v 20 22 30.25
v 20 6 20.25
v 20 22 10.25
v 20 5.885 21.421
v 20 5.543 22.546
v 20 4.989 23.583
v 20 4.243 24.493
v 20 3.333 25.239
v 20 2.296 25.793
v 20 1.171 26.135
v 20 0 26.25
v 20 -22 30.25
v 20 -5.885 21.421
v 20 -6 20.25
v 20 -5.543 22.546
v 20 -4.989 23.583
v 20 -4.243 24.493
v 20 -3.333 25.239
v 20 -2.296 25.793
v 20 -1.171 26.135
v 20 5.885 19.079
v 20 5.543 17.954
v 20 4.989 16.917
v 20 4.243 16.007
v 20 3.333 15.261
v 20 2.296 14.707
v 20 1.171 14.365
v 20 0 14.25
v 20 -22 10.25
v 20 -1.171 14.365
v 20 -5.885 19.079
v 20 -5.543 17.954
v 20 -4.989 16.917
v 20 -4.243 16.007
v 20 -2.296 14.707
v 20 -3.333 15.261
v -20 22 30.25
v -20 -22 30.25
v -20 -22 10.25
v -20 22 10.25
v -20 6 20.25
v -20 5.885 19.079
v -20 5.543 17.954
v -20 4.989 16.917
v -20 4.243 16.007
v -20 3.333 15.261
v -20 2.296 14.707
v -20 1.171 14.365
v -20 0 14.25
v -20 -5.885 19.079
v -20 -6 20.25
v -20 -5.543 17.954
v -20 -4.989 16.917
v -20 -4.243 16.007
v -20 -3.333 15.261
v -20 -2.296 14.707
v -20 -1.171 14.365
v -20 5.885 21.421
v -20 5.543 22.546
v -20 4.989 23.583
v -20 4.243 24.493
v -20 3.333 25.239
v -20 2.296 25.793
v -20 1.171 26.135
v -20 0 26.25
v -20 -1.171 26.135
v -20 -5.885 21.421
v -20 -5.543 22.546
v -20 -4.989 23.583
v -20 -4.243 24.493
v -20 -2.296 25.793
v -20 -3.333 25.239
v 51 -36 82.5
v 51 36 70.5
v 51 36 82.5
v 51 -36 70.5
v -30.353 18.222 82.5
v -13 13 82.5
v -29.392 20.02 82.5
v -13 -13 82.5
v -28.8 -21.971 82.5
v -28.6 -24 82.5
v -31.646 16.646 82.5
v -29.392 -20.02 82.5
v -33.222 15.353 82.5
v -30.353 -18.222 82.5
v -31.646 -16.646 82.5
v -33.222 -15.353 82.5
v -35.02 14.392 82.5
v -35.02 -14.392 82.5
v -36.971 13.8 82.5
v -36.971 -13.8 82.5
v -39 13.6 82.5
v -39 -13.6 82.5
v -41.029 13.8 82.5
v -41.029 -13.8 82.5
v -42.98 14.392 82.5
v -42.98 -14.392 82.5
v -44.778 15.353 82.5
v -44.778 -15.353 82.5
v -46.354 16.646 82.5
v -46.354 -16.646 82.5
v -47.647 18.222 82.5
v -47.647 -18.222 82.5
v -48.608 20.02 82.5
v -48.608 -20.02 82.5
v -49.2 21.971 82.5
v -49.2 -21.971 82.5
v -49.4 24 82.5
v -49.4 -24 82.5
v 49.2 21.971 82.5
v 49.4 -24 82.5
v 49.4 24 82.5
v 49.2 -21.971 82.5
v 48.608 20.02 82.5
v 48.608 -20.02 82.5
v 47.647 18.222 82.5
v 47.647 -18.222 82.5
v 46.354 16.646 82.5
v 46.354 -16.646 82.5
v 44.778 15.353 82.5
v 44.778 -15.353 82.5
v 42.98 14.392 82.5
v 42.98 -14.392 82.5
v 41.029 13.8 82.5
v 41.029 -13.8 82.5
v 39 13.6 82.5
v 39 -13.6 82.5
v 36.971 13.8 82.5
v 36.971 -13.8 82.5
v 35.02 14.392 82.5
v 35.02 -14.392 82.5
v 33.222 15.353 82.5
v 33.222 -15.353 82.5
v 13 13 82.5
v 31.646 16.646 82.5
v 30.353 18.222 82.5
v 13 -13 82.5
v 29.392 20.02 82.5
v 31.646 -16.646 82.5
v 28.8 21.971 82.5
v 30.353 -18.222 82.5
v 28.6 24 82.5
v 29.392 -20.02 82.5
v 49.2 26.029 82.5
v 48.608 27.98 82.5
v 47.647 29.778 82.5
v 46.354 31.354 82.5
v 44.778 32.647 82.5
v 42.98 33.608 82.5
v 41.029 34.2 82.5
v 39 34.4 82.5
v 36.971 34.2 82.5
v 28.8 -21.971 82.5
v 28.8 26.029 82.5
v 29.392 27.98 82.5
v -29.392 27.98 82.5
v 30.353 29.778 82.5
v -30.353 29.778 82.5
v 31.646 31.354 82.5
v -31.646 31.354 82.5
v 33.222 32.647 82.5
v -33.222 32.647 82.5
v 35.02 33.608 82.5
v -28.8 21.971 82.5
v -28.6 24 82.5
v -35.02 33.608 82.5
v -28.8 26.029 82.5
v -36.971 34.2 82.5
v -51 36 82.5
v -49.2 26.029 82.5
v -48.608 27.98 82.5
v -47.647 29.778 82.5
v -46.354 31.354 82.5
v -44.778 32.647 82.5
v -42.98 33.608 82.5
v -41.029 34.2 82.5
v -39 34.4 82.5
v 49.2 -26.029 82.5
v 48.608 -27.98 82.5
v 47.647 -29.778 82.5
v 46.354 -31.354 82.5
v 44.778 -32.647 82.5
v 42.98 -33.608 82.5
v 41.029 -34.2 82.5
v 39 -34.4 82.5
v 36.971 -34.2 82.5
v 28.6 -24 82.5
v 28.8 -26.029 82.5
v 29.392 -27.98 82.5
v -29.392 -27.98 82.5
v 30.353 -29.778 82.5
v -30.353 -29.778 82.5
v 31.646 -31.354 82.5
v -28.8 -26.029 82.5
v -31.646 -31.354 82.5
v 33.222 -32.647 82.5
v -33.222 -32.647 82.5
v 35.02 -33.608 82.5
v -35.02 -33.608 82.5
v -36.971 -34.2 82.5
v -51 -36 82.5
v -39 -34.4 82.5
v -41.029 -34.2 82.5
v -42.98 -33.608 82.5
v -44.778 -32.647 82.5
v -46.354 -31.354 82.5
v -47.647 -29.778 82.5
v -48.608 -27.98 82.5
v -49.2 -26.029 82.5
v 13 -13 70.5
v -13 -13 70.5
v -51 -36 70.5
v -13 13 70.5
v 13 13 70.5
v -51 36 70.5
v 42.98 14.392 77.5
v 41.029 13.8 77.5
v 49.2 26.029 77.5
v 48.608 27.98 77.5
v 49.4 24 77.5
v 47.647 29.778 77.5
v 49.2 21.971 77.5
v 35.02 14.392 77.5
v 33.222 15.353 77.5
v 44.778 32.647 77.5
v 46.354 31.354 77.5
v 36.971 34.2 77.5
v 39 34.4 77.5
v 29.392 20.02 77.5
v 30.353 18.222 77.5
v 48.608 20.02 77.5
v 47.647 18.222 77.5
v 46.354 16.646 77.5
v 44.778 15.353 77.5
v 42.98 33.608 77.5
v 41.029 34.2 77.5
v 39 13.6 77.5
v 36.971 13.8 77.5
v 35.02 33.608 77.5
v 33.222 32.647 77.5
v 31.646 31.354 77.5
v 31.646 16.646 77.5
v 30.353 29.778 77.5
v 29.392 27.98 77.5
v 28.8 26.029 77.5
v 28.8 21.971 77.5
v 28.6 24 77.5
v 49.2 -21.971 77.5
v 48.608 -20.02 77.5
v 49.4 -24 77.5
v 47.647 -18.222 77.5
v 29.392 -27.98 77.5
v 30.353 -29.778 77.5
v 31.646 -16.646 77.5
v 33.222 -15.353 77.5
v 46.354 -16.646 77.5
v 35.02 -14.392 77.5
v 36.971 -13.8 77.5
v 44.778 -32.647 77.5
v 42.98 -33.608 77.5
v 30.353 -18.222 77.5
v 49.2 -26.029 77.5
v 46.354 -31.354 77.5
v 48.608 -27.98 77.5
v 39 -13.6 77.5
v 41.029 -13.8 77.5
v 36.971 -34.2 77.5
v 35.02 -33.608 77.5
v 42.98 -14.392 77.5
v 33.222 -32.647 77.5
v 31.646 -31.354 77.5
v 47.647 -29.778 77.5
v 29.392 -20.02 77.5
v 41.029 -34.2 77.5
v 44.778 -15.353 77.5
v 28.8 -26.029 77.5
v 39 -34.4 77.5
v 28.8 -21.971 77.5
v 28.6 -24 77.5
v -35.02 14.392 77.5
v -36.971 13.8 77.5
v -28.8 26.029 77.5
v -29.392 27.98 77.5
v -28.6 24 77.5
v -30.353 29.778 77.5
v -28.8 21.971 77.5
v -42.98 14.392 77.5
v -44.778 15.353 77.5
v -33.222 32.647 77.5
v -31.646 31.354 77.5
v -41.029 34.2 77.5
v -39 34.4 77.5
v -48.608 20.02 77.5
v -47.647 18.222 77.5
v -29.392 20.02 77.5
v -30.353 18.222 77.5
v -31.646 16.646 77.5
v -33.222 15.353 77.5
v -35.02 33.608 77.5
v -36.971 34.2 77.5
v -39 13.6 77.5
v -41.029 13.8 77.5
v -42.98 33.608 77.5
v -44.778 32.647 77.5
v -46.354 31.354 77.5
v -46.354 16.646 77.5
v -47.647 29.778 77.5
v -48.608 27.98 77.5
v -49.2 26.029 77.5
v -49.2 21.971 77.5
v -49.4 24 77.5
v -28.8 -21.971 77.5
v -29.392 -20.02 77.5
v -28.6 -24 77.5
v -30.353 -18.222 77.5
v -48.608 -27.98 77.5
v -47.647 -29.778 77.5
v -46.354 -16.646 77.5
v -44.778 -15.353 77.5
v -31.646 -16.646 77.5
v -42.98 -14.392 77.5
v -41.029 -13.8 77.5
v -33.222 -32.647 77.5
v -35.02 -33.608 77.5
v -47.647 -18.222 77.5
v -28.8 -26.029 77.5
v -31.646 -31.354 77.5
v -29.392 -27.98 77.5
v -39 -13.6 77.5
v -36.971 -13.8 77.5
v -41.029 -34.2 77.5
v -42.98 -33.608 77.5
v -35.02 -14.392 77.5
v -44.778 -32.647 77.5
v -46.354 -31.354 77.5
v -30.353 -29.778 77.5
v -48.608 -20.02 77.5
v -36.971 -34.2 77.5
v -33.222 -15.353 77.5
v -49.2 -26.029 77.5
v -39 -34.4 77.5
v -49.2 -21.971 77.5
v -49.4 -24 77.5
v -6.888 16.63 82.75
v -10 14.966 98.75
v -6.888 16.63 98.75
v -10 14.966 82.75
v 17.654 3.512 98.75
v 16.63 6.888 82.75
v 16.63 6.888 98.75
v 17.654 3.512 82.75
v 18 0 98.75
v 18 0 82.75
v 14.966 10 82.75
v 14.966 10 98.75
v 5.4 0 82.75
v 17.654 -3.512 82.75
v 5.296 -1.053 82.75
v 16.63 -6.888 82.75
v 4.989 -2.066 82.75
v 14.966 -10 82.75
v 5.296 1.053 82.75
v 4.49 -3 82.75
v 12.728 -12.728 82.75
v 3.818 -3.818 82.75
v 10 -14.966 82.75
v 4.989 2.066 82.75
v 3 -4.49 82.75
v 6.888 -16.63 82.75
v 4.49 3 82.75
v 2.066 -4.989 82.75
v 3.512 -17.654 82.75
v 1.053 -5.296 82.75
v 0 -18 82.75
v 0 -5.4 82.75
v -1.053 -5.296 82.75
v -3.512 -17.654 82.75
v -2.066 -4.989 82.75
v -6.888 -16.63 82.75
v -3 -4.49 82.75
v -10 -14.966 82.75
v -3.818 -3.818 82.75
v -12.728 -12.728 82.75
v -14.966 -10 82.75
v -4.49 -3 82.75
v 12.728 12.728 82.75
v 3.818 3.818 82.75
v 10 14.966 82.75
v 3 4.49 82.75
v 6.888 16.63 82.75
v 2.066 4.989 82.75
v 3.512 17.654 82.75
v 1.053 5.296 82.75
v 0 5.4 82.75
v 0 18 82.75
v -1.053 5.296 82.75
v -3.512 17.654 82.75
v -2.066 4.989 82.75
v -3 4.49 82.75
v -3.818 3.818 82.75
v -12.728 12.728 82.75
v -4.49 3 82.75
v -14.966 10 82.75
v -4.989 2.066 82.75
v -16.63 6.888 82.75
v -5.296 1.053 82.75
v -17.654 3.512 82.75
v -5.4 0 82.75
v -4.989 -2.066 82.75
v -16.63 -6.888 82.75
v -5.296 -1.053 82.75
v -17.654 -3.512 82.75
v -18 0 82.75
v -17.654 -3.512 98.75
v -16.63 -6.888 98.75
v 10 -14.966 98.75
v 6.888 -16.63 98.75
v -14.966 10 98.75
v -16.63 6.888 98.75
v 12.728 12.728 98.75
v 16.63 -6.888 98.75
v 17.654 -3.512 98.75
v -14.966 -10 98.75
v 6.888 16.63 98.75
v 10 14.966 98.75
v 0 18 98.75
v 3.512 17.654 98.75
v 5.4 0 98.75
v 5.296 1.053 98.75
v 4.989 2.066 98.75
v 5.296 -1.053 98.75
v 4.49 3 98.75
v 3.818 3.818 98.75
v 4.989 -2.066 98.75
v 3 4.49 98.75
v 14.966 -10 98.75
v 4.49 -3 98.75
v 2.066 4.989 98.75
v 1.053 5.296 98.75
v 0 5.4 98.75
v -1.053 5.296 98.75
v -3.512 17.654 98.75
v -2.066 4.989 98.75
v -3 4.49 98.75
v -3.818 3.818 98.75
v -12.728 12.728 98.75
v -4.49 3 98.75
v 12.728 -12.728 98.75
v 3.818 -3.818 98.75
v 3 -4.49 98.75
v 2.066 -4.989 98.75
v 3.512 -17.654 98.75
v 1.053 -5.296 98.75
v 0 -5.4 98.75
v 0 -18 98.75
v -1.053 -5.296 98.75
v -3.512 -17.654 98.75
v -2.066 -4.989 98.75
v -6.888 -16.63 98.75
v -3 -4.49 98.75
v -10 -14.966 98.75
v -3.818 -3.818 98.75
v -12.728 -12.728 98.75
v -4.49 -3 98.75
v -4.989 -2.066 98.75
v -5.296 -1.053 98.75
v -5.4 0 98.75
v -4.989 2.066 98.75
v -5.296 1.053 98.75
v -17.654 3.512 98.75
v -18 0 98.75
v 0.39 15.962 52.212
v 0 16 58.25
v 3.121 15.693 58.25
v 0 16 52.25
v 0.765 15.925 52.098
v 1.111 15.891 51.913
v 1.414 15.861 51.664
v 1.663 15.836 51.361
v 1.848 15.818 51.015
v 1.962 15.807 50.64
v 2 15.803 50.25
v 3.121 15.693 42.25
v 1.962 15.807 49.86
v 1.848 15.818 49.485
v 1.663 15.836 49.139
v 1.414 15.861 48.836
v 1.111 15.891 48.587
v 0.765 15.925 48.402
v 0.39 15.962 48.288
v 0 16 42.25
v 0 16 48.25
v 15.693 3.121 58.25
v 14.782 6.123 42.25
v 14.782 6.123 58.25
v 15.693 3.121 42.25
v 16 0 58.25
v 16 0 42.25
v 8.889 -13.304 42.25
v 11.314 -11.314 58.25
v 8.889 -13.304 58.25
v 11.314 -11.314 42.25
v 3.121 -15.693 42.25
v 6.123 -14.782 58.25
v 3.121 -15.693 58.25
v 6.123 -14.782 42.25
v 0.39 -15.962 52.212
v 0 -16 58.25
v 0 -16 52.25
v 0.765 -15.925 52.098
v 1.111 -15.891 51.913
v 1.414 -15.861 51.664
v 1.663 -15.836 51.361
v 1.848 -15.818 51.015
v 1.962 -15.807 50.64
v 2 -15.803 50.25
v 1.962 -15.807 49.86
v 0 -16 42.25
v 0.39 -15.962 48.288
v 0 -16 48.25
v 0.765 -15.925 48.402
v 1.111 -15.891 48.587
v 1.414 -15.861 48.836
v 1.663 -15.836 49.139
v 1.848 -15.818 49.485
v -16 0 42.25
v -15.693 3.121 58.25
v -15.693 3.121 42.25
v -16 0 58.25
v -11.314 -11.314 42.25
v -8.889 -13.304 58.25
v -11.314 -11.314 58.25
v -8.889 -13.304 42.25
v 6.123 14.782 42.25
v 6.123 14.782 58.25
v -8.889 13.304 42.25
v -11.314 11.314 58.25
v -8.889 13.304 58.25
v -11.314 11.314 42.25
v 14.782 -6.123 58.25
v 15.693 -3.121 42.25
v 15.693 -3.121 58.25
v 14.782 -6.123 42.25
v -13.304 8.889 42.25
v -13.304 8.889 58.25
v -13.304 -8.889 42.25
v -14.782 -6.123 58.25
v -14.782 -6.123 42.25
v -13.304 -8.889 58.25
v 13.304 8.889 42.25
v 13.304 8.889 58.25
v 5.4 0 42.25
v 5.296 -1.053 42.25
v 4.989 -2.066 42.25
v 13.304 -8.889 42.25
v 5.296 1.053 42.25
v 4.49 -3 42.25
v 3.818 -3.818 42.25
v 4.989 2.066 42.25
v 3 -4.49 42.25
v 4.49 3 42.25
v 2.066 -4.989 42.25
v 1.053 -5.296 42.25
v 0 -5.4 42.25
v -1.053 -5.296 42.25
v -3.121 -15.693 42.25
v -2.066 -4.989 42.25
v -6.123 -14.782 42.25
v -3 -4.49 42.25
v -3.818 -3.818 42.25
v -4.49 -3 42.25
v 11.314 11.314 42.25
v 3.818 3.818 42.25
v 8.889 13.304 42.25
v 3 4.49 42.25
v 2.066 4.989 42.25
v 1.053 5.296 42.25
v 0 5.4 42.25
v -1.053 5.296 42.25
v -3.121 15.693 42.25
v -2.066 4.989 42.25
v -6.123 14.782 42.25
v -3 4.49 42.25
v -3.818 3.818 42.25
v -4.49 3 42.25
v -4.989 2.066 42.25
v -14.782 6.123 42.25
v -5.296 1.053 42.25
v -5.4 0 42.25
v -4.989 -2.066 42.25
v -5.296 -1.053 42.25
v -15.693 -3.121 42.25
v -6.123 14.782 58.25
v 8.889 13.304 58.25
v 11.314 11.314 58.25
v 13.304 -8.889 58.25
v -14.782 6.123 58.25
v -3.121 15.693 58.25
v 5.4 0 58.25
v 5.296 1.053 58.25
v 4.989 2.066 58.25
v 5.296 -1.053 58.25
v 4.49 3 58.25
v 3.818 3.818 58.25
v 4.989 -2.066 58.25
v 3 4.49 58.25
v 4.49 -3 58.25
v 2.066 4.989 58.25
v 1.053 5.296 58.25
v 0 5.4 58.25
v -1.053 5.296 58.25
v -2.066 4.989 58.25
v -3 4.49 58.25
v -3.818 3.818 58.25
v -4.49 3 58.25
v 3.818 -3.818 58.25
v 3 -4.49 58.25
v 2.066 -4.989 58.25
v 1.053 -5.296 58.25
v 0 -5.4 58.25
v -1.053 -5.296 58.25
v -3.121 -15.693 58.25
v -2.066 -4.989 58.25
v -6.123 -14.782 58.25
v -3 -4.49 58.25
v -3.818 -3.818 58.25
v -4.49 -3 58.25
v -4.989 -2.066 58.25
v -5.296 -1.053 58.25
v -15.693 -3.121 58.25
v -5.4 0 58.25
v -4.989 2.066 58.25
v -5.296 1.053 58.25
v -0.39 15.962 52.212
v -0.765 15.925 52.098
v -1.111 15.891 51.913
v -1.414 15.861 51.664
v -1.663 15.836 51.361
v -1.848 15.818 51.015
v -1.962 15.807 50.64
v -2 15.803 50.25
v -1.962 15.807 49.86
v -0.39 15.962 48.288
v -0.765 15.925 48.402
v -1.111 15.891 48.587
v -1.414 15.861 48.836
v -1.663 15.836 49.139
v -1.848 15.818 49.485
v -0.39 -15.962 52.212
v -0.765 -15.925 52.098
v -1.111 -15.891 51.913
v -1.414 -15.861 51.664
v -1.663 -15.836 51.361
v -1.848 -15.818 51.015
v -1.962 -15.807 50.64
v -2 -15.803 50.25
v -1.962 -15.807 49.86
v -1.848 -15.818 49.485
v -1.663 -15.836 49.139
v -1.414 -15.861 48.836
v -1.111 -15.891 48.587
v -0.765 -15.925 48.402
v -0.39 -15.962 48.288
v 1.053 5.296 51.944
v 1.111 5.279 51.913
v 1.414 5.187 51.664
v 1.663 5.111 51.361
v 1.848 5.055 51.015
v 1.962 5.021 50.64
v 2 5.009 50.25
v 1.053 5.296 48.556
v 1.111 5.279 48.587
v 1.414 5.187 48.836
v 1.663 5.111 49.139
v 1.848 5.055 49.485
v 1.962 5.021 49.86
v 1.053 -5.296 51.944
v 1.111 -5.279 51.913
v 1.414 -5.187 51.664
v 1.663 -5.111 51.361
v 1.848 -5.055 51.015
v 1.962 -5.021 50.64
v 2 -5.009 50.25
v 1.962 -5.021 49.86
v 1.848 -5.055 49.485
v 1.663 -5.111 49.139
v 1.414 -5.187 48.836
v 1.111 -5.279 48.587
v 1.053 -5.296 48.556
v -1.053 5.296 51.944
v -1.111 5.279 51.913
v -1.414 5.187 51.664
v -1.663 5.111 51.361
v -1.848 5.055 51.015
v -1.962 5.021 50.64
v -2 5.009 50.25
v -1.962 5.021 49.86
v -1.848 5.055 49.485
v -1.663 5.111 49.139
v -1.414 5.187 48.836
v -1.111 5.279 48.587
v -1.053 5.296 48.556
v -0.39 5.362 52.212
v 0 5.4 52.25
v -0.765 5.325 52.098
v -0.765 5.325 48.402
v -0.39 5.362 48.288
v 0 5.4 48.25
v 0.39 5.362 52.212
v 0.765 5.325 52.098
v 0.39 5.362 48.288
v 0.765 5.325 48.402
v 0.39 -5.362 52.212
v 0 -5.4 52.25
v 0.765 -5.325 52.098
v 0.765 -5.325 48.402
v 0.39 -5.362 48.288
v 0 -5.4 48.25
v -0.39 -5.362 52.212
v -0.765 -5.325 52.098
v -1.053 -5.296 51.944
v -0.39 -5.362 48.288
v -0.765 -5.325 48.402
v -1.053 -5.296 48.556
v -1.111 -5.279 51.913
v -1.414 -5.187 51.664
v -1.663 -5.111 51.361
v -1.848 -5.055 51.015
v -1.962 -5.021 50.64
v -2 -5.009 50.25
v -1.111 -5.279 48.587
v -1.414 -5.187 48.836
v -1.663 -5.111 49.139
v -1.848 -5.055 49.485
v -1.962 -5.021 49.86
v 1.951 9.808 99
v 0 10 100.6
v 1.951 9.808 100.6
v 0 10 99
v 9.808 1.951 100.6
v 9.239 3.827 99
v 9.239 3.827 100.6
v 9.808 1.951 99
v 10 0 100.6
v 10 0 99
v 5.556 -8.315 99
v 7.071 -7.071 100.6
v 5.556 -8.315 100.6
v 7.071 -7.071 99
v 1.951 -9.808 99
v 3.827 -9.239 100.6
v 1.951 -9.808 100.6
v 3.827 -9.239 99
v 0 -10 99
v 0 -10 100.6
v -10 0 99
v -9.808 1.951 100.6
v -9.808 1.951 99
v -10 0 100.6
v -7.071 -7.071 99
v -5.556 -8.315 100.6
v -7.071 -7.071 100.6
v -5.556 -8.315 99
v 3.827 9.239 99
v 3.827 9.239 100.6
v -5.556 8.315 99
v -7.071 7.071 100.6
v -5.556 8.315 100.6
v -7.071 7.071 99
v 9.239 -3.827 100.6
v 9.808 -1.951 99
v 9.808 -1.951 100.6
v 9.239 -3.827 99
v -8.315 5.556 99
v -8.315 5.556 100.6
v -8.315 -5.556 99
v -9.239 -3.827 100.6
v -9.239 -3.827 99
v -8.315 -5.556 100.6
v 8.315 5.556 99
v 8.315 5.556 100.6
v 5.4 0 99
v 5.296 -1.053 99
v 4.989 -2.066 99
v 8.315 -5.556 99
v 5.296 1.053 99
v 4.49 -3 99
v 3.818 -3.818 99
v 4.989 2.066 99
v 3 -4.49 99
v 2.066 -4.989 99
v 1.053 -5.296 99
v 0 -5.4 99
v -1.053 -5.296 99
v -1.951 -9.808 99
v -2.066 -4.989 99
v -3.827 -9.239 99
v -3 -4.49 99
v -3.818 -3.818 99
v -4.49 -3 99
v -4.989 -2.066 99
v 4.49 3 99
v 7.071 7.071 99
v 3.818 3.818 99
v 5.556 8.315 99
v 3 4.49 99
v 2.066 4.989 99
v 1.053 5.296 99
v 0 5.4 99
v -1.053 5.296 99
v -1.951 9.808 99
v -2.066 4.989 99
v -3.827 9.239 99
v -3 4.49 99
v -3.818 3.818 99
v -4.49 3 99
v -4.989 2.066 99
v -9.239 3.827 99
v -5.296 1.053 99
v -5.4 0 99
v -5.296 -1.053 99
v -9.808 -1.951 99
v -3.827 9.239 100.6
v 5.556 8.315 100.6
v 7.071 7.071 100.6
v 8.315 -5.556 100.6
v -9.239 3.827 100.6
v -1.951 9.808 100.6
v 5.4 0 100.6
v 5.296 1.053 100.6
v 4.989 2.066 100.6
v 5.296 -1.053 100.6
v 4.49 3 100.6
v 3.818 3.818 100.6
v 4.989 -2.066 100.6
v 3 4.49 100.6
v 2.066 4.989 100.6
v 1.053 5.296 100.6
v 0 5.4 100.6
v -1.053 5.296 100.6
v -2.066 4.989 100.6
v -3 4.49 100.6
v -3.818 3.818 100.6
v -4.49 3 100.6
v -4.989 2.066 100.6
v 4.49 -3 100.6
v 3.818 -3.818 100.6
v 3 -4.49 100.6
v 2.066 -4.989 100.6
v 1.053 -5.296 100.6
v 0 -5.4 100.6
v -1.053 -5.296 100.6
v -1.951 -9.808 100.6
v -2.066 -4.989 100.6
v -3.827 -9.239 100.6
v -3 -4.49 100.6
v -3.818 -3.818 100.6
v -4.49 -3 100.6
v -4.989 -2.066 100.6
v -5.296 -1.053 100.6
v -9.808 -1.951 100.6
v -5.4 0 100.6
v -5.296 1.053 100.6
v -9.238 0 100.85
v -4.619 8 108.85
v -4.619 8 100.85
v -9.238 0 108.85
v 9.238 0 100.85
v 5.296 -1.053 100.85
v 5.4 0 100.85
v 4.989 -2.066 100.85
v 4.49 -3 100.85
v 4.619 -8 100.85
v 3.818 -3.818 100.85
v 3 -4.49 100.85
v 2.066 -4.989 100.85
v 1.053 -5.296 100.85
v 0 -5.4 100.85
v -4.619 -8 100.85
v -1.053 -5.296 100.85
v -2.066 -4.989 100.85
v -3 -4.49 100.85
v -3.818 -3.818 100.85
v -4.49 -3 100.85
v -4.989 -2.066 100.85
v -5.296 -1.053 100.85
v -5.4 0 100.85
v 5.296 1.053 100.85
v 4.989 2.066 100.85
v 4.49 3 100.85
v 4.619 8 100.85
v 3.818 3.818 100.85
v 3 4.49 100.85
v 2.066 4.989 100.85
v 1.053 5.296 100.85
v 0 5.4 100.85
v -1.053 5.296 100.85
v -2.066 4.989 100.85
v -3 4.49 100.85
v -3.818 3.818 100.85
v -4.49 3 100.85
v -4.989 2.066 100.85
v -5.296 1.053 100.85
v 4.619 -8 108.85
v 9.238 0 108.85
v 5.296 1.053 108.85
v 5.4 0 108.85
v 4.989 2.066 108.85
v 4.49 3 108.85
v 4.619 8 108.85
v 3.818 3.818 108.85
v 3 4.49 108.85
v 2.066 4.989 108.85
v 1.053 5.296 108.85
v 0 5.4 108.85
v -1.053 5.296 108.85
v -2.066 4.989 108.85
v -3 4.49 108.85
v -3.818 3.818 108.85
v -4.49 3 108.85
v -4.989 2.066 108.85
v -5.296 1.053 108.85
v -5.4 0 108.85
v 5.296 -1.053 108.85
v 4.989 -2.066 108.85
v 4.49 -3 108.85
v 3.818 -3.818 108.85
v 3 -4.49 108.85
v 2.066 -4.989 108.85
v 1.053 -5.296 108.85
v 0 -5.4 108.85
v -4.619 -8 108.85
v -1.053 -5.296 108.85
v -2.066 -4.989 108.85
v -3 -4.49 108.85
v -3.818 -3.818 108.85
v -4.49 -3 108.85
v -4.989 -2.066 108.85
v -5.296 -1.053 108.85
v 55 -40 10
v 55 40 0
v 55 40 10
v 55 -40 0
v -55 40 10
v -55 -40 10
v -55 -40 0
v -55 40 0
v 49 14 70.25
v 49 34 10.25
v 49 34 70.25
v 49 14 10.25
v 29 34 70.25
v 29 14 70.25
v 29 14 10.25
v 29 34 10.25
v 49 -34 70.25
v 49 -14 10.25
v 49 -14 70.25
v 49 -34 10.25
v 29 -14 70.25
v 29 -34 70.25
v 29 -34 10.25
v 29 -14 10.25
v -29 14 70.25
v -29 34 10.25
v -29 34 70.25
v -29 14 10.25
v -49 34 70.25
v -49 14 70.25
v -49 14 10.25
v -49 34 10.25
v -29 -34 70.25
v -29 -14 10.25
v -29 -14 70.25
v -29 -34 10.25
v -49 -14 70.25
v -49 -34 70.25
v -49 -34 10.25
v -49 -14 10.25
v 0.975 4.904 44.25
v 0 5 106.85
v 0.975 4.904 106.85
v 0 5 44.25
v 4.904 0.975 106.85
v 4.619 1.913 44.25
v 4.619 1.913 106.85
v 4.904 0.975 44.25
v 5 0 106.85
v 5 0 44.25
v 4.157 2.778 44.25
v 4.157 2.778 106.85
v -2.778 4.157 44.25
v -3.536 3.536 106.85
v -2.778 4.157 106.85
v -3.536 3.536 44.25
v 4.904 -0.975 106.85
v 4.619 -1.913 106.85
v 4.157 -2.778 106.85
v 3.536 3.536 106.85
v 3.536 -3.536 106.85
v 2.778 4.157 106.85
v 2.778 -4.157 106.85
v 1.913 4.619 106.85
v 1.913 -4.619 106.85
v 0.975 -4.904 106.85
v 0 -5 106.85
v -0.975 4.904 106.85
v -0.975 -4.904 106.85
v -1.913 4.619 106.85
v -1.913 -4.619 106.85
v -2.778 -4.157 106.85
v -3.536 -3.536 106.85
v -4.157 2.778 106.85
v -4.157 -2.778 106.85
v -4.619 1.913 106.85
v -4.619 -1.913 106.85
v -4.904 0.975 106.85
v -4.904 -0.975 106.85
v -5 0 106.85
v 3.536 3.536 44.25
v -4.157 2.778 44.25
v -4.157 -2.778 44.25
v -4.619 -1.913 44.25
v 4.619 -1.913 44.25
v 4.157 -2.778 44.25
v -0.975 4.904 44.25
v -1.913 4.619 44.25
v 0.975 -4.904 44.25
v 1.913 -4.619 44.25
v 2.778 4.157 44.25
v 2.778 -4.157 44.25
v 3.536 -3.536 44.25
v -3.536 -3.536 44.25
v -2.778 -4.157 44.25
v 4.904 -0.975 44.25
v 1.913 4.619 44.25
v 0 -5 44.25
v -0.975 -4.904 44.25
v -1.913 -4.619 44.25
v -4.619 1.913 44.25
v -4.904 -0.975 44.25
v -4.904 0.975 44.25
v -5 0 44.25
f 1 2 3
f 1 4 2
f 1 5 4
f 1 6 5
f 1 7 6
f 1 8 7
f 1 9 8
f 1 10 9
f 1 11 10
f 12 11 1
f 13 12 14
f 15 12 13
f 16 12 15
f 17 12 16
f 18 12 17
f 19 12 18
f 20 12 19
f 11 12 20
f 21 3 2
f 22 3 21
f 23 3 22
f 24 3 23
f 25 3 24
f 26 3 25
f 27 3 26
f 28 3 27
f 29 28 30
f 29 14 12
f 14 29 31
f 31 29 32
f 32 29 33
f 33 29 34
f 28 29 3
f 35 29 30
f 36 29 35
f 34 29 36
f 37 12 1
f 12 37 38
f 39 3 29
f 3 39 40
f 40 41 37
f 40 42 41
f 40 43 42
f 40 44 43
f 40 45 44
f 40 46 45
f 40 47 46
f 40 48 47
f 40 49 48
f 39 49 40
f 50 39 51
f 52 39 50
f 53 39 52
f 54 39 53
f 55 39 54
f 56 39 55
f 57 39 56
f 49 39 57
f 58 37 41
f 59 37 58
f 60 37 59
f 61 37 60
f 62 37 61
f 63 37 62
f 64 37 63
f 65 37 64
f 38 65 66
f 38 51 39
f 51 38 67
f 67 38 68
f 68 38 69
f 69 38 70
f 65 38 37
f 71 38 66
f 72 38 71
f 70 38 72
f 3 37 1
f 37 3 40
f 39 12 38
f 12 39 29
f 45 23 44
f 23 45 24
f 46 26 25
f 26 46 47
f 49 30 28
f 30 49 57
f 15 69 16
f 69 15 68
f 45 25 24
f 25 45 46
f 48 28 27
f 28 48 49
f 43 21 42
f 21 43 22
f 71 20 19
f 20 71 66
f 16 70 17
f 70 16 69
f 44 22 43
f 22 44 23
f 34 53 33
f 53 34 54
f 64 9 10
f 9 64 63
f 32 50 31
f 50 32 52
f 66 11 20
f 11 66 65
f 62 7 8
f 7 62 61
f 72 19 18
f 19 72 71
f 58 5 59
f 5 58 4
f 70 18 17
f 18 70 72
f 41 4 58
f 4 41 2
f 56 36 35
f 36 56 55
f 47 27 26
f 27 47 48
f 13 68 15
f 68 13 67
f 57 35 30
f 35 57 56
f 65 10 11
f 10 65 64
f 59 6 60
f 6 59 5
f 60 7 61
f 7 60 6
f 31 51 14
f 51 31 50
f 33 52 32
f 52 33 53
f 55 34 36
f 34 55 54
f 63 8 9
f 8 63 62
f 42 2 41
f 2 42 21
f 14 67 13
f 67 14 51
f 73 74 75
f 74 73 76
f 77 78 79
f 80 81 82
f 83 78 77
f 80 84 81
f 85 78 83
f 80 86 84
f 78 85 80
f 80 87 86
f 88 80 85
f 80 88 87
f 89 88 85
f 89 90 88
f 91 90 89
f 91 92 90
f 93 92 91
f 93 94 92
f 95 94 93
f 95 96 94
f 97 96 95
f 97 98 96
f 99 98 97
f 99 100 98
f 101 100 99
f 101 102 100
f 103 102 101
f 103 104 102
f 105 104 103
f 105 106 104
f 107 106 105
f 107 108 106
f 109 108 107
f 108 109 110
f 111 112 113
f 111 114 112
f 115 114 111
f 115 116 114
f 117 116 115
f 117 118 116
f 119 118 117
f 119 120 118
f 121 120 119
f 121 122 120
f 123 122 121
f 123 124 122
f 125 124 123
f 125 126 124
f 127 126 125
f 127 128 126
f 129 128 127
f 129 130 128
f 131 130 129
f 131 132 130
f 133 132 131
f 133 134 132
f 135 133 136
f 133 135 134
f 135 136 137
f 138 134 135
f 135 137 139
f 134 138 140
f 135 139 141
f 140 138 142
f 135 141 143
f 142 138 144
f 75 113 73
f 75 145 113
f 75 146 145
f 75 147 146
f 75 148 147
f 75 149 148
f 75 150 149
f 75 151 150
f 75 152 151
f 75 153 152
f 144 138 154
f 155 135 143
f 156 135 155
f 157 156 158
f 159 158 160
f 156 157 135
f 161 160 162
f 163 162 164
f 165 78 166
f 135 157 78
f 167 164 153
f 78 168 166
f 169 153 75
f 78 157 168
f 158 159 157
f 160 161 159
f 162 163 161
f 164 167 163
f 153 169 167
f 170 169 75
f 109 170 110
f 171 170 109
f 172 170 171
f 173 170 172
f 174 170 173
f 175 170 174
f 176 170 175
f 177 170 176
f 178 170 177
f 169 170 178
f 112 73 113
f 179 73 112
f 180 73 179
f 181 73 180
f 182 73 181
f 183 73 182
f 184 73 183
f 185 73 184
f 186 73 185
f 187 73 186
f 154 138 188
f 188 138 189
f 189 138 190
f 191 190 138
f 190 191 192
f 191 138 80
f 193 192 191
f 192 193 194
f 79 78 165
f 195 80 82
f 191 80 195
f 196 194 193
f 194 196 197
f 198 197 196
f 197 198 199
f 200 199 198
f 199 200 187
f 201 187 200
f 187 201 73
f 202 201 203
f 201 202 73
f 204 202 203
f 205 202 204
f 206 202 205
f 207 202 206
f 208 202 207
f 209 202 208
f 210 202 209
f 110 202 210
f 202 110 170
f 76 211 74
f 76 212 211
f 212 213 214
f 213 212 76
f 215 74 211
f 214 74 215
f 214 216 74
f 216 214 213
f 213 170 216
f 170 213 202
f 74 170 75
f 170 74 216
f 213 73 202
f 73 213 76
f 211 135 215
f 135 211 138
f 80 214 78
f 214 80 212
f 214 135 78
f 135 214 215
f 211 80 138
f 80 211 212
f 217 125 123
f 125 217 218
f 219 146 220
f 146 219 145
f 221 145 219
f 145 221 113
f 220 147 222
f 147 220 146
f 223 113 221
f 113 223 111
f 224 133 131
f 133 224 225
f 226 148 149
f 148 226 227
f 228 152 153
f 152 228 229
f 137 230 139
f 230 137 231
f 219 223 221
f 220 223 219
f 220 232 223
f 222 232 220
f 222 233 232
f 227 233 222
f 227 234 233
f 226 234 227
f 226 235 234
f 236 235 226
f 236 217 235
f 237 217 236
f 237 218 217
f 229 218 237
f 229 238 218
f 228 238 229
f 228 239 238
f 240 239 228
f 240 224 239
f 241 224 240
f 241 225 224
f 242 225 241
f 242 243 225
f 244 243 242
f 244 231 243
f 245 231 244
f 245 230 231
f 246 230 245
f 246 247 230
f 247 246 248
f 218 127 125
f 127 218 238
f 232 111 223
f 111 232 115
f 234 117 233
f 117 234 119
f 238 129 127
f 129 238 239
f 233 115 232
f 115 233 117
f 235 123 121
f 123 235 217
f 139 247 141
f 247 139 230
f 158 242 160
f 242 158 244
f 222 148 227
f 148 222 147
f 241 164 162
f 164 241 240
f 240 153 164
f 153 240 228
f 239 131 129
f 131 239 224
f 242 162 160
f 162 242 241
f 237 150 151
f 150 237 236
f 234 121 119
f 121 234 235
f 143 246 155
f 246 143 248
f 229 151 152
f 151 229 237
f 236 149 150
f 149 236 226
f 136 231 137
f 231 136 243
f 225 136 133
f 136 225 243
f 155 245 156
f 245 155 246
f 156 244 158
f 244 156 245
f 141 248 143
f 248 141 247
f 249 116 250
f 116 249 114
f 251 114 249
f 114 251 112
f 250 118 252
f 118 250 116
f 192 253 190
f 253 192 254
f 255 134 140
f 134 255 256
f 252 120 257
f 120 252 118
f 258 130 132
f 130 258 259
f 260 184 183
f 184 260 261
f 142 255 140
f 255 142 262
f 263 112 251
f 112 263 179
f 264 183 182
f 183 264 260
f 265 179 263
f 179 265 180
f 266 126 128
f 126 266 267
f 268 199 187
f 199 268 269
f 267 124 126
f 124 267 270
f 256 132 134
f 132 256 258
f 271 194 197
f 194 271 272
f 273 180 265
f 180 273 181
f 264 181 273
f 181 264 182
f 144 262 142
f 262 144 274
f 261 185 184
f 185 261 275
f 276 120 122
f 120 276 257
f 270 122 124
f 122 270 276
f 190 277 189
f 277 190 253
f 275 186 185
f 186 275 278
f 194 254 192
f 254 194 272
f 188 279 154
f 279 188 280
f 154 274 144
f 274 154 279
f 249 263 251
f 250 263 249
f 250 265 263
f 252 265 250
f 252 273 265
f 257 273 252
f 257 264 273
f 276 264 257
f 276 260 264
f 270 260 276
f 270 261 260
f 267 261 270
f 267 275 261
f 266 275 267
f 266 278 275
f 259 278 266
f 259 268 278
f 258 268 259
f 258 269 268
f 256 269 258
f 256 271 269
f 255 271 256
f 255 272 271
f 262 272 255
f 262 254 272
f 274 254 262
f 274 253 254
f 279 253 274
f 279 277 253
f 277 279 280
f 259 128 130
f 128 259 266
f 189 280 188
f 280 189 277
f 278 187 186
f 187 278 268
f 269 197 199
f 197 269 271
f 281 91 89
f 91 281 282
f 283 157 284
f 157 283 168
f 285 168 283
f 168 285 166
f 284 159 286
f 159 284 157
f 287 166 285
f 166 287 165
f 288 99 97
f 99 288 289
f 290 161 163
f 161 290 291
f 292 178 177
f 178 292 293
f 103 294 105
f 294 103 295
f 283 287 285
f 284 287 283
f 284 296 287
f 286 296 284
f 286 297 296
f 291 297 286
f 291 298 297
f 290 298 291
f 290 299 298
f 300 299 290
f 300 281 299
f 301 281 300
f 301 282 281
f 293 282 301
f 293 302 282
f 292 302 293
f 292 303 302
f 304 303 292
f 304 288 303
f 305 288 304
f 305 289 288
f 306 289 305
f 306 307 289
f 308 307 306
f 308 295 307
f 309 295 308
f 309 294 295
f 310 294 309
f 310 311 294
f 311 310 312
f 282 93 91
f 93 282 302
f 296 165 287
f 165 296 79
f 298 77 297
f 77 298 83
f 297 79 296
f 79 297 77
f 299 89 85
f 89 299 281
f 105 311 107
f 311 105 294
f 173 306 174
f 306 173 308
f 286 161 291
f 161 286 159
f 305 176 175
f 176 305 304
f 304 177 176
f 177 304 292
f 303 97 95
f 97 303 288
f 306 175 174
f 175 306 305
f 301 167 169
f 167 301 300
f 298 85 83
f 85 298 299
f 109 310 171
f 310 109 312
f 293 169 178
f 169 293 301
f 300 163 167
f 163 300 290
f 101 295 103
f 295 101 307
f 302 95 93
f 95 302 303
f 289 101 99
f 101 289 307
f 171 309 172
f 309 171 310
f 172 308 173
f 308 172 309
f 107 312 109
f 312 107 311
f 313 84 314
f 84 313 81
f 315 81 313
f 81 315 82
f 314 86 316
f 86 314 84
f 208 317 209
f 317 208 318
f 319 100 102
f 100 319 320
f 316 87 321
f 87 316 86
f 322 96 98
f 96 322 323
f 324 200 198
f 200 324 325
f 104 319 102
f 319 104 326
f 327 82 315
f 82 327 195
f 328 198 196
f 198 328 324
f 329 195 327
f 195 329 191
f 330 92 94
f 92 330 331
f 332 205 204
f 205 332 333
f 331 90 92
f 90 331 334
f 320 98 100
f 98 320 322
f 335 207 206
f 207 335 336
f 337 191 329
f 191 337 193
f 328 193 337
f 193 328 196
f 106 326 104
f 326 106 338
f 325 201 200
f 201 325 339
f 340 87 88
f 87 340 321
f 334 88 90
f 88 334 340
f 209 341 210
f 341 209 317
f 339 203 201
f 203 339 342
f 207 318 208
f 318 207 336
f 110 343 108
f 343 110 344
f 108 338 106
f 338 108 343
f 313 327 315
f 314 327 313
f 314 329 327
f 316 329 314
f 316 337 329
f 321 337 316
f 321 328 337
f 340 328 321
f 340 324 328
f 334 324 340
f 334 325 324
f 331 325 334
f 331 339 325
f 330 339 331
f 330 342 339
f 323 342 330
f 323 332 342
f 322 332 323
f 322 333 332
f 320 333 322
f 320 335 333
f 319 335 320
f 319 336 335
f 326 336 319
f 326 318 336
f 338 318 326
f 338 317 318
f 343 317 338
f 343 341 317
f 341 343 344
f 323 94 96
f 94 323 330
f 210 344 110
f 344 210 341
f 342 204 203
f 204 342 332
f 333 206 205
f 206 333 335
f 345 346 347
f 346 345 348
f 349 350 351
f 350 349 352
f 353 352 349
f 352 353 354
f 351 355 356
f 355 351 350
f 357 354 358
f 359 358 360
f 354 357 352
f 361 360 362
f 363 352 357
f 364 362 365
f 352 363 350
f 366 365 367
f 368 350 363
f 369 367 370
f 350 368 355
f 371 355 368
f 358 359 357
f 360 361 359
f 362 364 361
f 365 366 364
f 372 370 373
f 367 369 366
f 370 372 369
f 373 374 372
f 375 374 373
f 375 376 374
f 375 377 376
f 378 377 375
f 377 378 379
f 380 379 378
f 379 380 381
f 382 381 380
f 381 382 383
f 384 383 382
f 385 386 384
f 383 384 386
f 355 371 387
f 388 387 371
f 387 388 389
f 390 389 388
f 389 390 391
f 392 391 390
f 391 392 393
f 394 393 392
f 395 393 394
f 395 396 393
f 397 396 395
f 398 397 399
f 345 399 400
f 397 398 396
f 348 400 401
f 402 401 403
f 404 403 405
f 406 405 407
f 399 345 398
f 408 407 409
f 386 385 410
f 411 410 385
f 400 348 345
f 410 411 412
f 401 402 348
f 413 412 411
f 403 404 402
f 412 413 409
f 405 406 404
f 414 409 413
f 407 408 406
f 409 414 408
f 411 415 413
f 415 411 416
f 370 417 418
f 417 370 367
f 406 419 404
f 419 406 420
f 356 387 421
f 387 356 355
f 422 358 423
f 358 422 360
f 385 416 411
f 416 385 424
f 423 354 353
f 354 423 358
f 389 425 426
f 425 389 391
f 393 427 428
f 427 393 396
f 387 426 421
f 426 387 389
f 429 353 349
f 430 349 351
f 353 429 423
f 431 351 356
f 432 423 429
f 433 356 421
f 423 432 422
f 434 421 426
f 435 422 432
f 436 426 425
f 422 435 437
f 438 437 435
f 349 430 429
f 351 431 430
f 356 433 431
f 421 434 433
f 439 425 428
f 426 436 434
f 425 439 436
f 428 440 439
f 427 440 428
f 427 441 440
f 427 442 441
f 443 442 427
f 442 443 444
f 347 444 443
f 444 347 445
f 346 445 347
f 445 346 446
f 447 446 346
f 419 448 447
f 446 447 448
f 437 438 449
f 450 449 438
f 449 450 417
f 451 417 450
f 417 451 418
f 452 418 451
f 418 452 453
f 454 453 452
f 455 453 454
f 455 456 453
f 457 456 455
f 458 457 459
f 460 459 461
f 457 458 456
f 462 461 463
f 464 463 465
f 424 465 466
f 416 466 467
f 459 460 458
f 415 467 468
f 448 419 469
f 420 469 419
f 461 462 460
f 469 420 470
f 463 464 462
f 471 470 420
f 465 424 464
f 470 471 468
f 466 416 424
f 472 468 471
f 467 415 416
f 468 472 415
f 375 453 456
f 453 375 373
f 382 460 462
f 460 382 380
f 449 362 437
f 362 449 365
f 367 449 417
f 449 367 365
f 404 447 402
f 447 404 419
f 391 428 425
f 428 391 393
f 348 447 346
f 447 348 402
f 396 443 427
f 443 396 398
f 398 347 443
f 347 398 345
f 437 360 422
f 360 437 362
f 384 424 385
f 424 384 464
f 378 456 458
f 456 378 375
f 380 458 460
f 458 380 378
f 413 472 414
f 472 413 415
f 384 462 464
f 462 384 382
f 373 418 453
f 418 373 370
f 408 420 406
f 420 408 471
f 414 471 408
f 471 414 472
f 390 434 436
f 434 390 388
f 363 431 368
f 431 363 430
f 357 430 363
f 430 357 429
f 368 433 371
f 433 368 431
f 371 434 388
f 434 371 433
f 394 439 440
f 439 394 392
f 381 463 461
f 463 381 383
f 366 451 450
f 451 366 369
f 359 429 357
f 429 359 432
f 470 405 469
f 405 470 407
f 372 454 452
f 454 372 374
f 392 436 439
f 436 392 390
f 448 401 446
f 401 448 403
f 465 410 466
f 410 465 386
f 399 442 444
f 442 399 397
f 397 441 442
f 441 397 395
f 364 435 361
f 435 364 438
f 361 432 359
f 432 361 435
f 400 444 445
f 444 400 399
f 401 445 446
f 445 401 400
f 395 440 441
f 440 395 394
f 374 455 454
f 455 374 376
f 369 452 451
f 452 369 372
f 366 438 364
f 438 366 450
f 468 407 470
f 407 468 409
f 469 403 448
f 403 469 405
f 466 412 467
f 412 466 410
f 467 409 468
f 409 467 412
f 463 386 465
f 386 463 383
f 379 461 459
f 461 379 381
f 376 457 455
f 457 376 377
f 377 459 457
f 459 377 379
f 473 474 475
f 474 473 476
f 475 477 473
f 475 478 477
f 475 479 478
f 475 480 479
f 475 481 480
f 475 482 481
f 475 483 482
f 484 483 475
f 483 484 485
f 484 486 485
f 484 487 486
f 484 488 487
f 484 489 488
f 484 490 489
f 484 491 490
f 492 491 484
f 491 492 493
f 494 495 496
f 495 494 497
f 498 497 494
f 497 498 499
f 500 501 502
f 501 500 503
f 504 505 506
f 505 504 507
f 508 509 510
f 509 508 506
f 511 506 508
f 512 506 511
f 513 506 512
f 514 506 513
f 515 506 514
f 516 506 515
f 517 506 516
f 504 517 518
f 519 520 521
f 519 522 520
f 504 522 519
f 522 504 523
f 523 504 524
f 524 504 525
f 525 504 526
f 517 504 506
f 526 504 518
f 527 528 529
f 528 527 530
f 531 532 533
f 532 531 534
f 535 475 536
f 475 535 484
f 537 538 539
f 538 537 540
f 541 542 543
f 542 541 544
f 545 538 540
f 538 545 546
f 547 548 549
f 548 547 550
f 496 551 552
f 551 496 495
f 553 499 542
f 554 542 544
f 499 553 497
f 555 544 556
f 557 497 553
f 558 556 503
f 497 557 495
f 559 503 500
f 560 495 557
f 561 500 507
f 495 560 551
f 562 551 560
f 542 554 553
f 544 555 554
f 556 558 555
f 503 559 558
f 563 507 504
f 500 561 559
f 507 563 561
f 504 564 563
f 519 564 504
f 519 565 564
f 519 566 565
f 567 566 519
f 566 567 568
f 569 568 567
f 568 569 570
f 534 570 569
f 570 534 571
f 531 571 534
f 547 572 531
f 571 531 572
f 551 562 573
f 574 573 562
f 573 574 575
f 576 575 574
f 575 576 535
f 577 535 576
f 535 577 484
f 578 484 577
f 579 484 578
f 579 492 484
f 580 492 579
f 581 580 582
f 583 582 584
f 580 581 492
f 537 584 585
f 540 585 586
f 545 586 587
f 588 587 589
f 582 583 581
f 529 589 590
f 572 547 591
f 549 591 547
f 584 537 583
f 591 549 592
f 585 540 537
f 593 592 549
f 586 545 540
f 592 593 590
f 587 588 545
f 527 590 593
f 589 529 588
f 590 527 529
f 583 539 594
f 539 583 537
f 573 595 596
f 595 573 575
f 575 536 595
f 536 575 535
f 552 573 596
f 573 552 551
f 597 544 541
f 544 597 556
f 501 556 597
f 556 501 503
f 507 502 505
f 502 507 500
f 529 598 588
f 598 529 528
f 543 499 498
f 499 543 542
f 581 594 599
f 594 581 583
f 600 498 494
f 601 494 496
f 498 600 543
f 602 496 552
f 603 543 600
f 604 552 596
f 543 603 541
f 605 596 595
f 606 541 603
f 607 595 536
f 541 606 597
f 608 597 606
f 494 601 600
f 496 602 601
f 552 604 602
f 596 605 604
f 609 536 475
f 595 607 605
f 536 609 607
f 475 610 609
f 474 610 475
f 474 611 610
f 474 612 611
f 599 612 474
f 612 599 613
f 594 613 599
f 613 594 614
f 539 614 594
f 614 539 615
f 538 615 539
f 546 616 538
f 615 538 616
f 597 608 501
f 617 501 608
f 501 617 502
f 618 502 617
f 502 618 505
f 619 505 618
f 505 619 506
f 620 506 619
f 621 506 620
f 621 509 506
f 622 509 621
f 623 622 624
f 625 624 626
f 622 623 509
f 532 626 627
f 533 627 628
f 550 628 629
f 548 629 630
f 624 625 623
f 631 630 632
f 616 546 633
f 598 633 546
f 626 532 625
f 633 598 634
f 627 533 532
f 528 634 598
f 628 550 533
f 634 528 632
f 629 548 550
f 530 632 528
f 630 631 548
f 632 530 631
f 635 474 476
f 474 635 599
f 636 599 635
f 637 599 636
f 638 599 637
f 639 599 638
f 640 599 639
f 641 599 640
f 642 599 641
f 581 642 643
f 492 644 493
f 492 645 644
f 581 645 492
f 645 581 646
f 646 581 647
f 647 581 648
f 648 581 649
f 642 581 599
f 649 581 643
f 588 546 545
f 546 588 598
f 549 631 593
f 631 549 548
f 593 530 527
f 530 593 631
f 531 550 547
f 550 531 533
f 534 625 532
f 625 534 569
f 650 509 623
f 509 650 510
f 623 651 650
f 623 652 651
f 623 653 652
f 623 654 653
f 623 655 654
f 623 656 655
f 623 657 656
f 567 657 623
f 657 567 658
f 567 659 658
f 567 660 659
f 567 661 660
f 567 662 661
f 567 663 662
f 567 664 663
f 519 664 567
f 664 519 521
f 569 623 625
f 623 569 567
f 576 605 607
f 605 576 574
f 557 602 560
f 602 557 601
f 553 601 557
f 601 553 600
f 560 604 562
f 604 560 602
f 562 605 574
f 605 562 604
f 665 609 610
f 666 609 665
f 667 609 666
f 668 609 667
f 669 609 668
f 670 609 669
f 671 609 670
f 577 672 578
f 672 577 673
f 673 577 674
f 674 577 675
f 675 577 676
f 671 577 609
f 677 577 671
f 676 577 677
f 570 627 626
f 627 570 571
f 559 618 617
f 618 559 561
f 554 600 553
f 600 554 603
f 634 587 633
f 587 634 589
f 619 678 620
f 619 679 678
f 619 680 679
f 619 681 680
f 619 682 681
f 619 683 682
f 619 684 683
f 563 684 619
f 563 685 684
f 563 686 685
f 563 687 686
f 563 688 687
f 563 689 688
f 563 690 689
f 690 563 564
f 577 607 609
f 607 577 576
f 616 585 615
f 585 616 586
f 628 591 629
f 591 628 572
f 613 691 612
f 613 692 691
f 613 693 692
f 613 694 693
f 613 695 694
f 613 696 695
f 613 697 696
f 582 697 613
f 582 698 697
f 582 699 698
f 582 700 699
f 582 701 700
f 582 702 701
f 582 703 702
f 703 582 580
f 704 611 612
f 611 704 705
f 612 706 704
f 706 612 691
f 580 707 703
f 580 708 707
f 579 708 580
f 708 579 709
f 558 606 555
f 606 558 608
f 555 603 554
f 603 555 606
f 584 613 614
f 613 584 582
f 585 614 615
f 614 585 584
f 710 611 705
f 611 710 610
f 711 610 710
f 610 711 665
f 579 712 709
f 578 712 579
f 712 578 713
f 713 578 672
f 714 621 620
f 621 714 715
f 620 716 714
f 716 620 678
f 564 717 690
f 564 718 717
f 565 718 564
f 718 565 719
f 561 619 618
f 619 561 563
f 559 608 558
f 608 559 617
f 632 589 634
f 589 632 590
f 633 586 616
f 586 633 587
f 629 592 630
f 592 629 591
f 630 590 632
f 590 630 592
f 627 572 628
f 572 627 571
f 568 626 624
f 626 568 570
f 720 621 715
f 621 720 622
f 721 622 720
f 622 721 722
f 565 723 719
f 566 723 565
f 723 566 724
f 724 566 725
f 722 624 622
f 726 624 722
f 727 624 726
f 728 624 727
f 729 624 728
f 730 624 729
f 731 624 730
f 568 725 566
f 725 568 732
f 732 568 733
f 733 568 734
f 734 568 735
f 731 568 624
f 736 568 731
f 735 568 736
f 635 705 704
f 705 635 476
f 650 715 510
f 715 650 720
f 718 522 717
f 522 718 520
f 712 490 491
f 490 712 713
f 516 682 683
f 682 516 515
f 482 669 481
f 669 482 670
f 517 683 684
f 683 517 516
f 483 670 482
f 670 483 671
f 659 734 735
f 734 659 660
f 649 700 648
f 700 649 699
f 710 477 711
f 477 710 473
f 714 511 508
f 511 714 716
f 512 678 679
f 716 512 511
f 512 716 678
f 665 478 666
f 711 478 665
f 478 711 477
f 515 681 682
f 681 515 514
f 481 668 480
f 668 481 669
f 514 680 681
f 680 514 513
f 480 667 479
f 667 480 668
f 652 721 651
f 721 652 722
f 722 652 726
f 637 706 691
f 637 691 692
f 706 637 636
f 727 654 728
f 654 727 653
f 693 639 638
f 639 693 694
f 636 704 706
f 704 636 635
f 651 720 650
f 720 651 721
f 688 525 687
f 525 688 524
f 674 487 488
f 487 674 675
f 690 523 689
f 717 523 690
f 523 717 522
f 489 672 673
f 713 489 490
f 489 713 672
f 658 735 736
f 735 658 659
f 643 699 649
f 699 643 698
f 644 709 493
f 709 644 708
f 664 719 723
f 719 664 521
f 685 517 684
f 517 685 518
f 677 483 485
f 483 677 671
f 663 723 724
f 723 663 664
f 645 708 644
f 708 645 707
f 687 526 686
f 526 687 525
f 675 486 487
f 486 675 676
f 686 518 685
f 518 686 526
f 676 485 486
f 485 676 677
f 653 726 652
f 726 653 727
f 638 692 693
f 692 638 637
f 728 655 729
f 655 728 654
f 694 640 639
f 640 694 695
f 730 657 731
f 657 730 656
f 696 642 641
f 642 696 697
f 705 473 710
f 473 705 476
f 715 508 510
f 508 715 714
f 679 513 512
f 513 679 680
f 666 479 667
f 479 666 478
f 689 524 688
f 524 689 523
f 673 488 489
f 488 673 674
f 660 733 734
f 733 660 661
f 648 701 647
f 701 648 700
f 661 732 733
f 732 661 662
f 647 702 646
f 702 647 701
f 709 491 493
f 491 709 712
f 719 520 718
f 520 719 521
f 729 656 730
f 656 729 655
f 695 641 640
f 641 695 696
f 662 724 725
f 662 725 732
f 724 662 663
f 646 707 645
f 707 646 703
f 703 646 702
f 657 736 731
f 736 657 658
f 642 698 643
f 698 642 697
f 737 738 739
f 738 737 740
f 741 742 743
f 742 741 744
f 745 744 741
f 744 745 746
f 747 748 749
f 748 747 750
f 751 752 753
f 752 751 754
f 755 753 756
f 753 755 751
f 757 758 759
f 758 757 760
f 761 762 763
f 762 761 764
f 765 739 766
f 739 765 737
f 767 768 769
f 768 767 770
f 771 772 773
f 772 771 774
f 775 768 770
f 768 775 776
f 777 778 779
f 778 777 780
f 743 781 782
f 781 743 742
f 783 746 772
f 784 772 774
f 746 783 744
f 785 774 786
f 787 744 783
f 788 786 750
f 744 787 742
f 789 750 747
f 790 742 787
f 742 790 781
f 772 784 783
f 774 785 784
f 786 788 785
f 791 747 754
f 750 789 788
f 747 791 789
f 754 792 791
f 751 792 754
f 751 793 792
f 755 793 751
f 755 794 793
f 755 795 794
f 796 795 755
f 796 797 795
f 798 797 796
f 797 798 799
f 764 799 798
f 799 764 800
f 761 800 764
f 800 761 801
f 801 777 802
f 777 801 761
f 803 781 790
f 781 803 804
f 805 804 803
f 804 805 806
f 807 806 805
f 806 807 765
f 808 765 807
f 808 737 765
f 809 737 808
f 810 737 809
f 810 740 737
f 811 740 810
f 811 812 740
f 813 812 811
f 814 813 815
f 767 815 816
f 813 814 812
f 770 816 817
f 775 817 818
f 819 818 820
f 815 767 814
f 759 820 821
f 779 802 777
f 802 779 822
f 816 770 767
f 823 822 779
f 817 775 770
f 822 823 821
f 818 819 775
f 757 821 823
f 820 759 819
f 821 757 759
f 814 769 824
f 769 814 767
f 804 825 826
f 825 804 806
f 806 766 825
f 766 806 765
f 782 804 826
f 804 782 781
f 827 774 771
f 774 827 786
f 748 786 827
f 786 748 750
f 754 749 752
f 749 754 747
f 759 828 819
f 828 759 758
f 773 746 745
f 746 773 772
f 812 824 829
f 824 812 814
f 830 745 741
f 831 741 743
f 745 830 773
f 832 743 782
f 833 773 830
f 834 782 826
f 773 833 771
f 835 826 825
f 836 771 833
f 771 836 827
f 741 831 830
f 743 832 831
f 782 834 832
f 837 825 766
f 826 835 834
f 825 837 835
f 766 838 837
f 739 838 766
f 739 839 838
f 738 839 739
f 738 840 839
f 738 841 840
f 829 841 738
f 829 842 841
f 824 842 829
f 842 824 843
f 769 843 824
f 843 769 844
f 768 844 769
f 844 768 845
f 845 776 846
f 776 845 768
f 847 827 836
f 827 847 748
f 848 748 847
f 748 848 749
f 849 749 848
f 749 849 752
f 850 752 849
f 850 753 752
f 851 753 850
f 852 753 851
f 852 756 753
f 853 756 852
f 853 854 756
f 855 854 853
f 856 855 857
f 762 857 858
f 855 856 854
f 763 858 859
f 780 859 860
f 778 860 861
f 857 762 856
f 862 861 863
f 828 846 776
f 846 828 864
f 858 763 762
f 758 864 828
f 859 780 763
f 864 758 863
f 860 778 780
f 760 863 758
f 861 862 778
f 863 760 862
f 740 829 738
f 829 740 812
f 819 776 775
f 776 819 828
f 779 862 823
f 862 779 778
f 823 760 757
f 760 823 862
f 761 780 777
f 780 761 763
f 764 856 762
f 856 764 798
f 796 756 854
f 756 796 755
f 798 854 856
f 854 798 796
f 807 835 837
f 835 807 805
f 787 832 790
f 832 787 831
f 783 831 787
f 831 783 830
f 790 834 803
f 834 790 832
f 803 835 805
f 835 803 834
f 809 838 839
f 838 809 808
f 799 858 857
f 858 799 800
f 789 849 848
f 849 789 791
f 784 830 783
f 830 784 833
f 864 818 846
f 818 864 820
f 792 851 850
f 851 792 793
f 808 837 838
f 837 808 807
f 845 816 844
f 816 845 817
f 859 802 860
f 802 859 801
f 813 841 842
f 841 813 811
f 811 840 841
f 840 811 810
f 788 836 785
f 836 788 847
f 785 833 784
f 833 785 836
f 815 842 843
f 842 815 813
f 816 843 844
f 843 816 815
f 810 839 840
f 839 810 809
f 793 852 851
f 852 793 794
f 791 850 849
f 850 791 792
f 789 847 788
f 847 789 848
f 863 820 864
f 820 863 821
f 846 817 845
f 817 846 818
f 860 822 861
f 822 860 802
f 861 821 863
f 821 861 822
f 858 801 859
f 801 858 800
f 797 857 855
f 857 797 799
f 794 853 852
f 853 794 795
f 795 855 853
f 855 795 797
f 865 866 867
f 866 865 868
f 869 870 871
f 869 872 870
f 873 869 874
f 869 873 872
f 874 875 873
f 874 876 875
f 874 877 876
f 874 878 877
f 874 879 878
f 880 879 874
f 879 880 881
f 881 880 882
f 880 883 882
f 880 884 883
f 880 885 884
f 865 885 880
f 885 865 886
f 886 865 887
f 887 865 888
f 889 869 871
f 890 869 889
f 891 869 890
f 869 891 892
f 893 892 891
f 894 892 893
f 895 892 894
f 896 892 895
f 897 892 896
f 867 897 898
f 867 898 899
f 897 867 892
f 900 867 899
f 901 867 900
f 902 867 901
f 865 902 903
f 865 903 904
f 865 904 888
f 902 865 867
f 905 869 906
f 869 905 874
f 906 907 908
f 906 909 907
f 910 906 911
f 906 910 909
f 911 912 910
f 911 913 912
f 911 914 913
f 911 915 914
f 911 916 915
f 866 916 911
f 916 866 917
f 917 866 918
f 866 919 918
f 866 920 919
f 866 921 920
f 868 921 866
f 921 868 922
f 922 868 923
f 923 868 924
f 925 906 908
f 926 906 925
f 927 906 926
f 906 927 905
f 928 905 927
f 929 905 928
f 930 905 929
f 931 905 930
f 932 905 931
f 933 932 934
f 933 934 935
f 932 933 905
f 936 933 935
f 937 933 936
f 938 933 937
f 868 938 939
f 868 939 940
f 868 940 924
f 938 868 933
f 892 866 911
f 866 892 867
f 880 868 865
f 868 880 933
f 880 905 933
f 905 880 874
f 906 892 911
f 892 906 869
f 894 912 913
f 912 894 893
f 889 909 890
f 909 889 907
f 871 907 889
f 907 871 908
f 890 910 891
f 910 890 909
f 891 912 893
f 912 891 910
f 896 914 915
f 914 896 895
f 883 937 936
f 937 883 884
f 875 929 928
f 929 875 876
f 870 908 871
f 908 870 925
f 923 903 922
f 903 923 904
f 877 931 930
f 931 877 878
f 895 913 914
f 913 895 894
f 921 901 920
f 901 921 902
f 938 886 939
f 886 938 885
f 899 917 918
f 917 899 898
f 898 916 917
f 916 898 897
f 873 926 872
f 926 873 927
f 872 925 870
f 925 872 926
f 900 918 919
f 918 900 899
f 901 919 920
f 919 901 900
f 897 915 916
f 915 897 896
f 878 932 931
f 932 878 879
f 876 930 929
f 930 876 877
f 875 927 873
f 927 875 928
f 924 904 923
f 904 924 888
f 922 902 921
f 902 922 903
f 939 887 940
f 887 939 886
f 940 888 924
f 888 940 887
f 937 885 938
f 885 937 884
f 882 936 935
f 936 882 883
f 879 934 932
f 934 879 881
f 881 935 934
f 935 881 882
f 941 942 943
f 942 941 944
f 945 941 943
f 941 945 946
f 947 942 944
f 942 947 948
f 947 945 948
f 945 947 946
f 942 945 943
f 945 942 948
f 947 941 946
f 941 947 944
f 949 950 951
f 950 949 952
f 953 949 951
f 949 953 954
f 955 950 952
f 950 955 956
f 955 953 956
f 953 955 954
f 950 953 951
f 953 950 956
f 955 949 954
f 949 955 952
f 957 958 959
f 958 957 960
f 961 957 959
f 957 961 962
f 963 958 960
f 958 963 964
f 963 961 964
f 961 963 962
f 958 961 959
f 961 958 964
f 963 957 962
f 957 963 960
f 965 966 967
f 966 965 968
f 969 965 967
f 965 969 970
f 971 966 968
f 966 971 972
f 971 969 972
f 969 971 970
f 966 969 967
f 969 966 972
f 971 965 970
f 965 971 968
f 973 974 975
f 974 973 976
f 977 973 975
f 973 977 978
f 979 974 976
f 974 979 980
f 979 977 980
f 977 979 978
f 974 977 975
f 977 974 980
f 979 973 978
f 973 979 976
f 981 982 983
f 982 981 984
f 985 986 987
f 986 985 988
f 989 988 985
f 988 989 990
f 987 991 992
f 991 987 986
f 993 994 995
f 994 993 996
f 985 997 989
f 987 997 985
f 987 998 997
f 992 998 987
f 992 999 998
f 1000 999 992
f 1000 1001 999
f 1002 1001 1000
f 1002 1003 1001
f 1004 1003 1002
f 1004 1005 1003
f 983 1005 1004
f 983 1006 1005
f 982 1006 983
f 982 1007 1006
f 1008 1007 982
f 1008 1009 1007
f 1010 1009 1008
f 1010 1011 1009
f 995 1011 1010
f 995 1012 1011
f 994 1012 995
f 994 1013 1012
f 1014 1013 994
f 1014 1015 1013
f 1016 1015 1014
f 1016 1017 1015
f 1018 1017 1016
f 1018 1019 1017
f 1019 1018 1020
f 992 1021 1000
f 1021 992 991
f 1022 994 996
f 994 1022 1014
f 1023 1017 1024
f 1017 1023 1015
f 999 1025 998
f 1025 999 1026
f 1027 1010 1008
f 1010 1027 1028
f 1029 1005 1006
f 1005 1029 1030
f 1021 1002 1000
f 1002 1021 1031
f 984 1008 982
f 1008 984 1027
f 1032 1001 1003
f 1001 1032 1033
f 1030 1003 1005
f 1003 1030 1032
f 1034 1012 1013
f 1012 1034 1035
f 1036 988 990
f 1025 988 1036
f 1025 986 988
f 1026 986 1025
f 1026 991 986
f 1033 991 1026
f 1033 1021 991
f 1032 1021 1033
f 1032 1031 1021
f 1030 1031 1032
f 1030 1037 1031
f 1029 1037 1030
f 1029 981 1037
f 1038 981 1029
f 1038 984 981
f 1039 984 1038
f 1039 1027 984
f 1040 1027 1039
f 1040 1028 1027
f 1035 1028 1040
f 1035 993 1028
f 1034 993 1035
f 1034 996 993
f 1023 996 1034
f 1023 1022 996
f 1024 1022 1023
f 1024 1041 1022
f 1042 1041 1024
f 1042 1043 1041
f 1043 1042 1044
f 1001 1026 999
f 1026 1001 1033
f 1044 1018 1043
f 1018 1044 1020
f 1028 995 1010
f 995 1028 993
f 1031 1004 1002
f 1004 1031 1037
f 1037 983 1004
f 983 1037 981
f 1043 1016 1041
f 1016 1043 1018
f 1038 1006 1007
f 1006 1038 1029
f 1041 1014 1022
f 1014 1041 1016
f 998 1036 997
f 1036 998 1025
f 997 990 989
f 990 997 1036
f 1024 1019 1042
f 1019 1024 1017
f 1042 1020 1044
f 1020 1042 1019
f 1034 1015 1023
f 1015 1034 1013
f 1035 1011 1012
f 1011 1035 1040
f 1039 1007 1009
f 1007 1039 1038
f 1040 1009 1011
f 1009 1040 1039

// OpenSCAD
$fn = 32;

// ------------------------------------------------------------------------
// Arbor press fixture: screw d10, posts 60 mm, gap 12 mm
// Every part is its own module, assembly() places every instance.
// ------------------------------------------------------------------------

// --- part 1 ---
module press_bed() {
  difference() {
    translate([-55, -40, 0]) cube([110, 80, 10]);
  }
}

// --- part 2 ---
module anvil_block() {
  difference() {
    translate([-20, -22, 0]) cube([40, 44, 20]);
    translate([0, 0, 10]) rotate([0, 90, 0]) cylinder(h = 42, d = 12, center = true);
  }
}

// --- part 3 ---
module press_post_a() {
  translate([-10, -10, 0]) cube([20, 20, 60]);
}

// --- part 4 ---
module press_post_b() {
  translate([-10, -10, 0]) cube([20, 20, 60]);
}

// --- part 5 ---
module press_post_c() {
  translate([-10, -10, 0]) cube([20, 20, 60]);
}

// --- part 6 ---
module press_post_d() {
  translate([-10, -10, 0]) cube([20, 20, 60]);
}

// --- part 7 ---
module press_frame() {
  difference() {
    translate([-51, -36, 0]) cube([102, 72, 12]);
    translate([-13, -13, -1]) cube([26, 26, 14]);
    translate([39, 24, 7]) cylinder(h = 6, d = 20.8);
    translate([39, -24, 7]) cylinder(h = 6, d = 20.8);
    translate([-39, 24, 7]) cylinder(h = 6, d = 20.8);
    translate([-39, -24, 7]) cylinder(h = 6, d = 20.8);
  }
}

// --- part 8 ---
module guide_ring() {
  difference() {
      translate([0, 0, 0]) cylinder(h = 16, d = 36);
      translate([0, 0, -1]) cylinder(h = 18, d = 10.8);
    }
}

// --- part 9 ---
module press_screw() {
  translate([0, 0, -31.3]) cylinder(h = 62.6, d = 10);
}

// --- part 10 ---
module press_head() {
  difference() {
    cylinder(h = 16, d = 32);
    translate([0, 0, -1]) cylinder(h = 18, d = 10.8);
    translate([0, 0, 8]) rotate([90, 0, 0]) cylinder(h = 34, d = 4, center = true);
  }
}

// --- part 11 ---
module nut_washer() {
  difference() {
      translate([0, 0, 0]) cylinder(h = 1.6, d = 20);
      translate([0, 0, -1]) cylinder(h = 3.6, d = 10.8);
    }
}

// --- part 12 ---
module press_nut() {
  difference() {
    linear_extrude(height = 8) polygon(points = [[9.238, 0], [4.619, 8], [-4.619, 8], [-9.238, 0], [-4.619, -8], [4.619, -8]]);
    translate([0, 0, -1]) cylinder(h = 10, d = 10.8);
  }
}

// --- assembly ---
module assembly() {
  color([0.80, 0.24, 0.20]) translate([0, 0, 0]) rotate([0, 0, 0]) press_bed();
  color([0.20, 0.45, 0.75]) translate([0, 0, 10.25]) rotate([0, 0, 0]) anvil_block();
  color([0.25, 0.62, 0.32]) translate([39, 24, 10.25]) rotate([0, 0, 0]) press_post_a();
  color([0.92, 0.70, 0.18]) translate([39, -24, 10.25]) rotate([0, 0, 0]) press_post_b();
  color([0.58, 0.35, 0.70]) translate([-39, 24, 10.25]) rotate([0, 0, 0]) press_post_c();
  color([0.16, 0.66, 0.66]) translate([-39, -24, 10.25]) rotate([0, 0, 0]) press_post_d();
  color([0.85, 0.48, 0.18]) translate([0, 0, 70.5]) rotate([0, 0, 0]) press_frame();
  color([0.55, 0.60, 0.65]) translate([0, 0, 82.75]) rotate([0, 0, 0]) guide_ring();
  color([0.75, 0.30, 0.55]) translate([0, 0, 75.55]) rotate([0, 0, 0]) press_screw();
  color([0.42, 0.52, 0.28]) translate([0, 0, 42.25]) rotate([0, 0, 0]) press_head();
  color([0.80, 0.24, 0.20]) translate([0, 0, 99]) rotate([0, 0, 0]) nut_washer();
  color([0.20, 0.45, 0.75]) translate([0, 0, 100.85]) rotate([0, 0, 0]) press_nut();
}

assembly();
